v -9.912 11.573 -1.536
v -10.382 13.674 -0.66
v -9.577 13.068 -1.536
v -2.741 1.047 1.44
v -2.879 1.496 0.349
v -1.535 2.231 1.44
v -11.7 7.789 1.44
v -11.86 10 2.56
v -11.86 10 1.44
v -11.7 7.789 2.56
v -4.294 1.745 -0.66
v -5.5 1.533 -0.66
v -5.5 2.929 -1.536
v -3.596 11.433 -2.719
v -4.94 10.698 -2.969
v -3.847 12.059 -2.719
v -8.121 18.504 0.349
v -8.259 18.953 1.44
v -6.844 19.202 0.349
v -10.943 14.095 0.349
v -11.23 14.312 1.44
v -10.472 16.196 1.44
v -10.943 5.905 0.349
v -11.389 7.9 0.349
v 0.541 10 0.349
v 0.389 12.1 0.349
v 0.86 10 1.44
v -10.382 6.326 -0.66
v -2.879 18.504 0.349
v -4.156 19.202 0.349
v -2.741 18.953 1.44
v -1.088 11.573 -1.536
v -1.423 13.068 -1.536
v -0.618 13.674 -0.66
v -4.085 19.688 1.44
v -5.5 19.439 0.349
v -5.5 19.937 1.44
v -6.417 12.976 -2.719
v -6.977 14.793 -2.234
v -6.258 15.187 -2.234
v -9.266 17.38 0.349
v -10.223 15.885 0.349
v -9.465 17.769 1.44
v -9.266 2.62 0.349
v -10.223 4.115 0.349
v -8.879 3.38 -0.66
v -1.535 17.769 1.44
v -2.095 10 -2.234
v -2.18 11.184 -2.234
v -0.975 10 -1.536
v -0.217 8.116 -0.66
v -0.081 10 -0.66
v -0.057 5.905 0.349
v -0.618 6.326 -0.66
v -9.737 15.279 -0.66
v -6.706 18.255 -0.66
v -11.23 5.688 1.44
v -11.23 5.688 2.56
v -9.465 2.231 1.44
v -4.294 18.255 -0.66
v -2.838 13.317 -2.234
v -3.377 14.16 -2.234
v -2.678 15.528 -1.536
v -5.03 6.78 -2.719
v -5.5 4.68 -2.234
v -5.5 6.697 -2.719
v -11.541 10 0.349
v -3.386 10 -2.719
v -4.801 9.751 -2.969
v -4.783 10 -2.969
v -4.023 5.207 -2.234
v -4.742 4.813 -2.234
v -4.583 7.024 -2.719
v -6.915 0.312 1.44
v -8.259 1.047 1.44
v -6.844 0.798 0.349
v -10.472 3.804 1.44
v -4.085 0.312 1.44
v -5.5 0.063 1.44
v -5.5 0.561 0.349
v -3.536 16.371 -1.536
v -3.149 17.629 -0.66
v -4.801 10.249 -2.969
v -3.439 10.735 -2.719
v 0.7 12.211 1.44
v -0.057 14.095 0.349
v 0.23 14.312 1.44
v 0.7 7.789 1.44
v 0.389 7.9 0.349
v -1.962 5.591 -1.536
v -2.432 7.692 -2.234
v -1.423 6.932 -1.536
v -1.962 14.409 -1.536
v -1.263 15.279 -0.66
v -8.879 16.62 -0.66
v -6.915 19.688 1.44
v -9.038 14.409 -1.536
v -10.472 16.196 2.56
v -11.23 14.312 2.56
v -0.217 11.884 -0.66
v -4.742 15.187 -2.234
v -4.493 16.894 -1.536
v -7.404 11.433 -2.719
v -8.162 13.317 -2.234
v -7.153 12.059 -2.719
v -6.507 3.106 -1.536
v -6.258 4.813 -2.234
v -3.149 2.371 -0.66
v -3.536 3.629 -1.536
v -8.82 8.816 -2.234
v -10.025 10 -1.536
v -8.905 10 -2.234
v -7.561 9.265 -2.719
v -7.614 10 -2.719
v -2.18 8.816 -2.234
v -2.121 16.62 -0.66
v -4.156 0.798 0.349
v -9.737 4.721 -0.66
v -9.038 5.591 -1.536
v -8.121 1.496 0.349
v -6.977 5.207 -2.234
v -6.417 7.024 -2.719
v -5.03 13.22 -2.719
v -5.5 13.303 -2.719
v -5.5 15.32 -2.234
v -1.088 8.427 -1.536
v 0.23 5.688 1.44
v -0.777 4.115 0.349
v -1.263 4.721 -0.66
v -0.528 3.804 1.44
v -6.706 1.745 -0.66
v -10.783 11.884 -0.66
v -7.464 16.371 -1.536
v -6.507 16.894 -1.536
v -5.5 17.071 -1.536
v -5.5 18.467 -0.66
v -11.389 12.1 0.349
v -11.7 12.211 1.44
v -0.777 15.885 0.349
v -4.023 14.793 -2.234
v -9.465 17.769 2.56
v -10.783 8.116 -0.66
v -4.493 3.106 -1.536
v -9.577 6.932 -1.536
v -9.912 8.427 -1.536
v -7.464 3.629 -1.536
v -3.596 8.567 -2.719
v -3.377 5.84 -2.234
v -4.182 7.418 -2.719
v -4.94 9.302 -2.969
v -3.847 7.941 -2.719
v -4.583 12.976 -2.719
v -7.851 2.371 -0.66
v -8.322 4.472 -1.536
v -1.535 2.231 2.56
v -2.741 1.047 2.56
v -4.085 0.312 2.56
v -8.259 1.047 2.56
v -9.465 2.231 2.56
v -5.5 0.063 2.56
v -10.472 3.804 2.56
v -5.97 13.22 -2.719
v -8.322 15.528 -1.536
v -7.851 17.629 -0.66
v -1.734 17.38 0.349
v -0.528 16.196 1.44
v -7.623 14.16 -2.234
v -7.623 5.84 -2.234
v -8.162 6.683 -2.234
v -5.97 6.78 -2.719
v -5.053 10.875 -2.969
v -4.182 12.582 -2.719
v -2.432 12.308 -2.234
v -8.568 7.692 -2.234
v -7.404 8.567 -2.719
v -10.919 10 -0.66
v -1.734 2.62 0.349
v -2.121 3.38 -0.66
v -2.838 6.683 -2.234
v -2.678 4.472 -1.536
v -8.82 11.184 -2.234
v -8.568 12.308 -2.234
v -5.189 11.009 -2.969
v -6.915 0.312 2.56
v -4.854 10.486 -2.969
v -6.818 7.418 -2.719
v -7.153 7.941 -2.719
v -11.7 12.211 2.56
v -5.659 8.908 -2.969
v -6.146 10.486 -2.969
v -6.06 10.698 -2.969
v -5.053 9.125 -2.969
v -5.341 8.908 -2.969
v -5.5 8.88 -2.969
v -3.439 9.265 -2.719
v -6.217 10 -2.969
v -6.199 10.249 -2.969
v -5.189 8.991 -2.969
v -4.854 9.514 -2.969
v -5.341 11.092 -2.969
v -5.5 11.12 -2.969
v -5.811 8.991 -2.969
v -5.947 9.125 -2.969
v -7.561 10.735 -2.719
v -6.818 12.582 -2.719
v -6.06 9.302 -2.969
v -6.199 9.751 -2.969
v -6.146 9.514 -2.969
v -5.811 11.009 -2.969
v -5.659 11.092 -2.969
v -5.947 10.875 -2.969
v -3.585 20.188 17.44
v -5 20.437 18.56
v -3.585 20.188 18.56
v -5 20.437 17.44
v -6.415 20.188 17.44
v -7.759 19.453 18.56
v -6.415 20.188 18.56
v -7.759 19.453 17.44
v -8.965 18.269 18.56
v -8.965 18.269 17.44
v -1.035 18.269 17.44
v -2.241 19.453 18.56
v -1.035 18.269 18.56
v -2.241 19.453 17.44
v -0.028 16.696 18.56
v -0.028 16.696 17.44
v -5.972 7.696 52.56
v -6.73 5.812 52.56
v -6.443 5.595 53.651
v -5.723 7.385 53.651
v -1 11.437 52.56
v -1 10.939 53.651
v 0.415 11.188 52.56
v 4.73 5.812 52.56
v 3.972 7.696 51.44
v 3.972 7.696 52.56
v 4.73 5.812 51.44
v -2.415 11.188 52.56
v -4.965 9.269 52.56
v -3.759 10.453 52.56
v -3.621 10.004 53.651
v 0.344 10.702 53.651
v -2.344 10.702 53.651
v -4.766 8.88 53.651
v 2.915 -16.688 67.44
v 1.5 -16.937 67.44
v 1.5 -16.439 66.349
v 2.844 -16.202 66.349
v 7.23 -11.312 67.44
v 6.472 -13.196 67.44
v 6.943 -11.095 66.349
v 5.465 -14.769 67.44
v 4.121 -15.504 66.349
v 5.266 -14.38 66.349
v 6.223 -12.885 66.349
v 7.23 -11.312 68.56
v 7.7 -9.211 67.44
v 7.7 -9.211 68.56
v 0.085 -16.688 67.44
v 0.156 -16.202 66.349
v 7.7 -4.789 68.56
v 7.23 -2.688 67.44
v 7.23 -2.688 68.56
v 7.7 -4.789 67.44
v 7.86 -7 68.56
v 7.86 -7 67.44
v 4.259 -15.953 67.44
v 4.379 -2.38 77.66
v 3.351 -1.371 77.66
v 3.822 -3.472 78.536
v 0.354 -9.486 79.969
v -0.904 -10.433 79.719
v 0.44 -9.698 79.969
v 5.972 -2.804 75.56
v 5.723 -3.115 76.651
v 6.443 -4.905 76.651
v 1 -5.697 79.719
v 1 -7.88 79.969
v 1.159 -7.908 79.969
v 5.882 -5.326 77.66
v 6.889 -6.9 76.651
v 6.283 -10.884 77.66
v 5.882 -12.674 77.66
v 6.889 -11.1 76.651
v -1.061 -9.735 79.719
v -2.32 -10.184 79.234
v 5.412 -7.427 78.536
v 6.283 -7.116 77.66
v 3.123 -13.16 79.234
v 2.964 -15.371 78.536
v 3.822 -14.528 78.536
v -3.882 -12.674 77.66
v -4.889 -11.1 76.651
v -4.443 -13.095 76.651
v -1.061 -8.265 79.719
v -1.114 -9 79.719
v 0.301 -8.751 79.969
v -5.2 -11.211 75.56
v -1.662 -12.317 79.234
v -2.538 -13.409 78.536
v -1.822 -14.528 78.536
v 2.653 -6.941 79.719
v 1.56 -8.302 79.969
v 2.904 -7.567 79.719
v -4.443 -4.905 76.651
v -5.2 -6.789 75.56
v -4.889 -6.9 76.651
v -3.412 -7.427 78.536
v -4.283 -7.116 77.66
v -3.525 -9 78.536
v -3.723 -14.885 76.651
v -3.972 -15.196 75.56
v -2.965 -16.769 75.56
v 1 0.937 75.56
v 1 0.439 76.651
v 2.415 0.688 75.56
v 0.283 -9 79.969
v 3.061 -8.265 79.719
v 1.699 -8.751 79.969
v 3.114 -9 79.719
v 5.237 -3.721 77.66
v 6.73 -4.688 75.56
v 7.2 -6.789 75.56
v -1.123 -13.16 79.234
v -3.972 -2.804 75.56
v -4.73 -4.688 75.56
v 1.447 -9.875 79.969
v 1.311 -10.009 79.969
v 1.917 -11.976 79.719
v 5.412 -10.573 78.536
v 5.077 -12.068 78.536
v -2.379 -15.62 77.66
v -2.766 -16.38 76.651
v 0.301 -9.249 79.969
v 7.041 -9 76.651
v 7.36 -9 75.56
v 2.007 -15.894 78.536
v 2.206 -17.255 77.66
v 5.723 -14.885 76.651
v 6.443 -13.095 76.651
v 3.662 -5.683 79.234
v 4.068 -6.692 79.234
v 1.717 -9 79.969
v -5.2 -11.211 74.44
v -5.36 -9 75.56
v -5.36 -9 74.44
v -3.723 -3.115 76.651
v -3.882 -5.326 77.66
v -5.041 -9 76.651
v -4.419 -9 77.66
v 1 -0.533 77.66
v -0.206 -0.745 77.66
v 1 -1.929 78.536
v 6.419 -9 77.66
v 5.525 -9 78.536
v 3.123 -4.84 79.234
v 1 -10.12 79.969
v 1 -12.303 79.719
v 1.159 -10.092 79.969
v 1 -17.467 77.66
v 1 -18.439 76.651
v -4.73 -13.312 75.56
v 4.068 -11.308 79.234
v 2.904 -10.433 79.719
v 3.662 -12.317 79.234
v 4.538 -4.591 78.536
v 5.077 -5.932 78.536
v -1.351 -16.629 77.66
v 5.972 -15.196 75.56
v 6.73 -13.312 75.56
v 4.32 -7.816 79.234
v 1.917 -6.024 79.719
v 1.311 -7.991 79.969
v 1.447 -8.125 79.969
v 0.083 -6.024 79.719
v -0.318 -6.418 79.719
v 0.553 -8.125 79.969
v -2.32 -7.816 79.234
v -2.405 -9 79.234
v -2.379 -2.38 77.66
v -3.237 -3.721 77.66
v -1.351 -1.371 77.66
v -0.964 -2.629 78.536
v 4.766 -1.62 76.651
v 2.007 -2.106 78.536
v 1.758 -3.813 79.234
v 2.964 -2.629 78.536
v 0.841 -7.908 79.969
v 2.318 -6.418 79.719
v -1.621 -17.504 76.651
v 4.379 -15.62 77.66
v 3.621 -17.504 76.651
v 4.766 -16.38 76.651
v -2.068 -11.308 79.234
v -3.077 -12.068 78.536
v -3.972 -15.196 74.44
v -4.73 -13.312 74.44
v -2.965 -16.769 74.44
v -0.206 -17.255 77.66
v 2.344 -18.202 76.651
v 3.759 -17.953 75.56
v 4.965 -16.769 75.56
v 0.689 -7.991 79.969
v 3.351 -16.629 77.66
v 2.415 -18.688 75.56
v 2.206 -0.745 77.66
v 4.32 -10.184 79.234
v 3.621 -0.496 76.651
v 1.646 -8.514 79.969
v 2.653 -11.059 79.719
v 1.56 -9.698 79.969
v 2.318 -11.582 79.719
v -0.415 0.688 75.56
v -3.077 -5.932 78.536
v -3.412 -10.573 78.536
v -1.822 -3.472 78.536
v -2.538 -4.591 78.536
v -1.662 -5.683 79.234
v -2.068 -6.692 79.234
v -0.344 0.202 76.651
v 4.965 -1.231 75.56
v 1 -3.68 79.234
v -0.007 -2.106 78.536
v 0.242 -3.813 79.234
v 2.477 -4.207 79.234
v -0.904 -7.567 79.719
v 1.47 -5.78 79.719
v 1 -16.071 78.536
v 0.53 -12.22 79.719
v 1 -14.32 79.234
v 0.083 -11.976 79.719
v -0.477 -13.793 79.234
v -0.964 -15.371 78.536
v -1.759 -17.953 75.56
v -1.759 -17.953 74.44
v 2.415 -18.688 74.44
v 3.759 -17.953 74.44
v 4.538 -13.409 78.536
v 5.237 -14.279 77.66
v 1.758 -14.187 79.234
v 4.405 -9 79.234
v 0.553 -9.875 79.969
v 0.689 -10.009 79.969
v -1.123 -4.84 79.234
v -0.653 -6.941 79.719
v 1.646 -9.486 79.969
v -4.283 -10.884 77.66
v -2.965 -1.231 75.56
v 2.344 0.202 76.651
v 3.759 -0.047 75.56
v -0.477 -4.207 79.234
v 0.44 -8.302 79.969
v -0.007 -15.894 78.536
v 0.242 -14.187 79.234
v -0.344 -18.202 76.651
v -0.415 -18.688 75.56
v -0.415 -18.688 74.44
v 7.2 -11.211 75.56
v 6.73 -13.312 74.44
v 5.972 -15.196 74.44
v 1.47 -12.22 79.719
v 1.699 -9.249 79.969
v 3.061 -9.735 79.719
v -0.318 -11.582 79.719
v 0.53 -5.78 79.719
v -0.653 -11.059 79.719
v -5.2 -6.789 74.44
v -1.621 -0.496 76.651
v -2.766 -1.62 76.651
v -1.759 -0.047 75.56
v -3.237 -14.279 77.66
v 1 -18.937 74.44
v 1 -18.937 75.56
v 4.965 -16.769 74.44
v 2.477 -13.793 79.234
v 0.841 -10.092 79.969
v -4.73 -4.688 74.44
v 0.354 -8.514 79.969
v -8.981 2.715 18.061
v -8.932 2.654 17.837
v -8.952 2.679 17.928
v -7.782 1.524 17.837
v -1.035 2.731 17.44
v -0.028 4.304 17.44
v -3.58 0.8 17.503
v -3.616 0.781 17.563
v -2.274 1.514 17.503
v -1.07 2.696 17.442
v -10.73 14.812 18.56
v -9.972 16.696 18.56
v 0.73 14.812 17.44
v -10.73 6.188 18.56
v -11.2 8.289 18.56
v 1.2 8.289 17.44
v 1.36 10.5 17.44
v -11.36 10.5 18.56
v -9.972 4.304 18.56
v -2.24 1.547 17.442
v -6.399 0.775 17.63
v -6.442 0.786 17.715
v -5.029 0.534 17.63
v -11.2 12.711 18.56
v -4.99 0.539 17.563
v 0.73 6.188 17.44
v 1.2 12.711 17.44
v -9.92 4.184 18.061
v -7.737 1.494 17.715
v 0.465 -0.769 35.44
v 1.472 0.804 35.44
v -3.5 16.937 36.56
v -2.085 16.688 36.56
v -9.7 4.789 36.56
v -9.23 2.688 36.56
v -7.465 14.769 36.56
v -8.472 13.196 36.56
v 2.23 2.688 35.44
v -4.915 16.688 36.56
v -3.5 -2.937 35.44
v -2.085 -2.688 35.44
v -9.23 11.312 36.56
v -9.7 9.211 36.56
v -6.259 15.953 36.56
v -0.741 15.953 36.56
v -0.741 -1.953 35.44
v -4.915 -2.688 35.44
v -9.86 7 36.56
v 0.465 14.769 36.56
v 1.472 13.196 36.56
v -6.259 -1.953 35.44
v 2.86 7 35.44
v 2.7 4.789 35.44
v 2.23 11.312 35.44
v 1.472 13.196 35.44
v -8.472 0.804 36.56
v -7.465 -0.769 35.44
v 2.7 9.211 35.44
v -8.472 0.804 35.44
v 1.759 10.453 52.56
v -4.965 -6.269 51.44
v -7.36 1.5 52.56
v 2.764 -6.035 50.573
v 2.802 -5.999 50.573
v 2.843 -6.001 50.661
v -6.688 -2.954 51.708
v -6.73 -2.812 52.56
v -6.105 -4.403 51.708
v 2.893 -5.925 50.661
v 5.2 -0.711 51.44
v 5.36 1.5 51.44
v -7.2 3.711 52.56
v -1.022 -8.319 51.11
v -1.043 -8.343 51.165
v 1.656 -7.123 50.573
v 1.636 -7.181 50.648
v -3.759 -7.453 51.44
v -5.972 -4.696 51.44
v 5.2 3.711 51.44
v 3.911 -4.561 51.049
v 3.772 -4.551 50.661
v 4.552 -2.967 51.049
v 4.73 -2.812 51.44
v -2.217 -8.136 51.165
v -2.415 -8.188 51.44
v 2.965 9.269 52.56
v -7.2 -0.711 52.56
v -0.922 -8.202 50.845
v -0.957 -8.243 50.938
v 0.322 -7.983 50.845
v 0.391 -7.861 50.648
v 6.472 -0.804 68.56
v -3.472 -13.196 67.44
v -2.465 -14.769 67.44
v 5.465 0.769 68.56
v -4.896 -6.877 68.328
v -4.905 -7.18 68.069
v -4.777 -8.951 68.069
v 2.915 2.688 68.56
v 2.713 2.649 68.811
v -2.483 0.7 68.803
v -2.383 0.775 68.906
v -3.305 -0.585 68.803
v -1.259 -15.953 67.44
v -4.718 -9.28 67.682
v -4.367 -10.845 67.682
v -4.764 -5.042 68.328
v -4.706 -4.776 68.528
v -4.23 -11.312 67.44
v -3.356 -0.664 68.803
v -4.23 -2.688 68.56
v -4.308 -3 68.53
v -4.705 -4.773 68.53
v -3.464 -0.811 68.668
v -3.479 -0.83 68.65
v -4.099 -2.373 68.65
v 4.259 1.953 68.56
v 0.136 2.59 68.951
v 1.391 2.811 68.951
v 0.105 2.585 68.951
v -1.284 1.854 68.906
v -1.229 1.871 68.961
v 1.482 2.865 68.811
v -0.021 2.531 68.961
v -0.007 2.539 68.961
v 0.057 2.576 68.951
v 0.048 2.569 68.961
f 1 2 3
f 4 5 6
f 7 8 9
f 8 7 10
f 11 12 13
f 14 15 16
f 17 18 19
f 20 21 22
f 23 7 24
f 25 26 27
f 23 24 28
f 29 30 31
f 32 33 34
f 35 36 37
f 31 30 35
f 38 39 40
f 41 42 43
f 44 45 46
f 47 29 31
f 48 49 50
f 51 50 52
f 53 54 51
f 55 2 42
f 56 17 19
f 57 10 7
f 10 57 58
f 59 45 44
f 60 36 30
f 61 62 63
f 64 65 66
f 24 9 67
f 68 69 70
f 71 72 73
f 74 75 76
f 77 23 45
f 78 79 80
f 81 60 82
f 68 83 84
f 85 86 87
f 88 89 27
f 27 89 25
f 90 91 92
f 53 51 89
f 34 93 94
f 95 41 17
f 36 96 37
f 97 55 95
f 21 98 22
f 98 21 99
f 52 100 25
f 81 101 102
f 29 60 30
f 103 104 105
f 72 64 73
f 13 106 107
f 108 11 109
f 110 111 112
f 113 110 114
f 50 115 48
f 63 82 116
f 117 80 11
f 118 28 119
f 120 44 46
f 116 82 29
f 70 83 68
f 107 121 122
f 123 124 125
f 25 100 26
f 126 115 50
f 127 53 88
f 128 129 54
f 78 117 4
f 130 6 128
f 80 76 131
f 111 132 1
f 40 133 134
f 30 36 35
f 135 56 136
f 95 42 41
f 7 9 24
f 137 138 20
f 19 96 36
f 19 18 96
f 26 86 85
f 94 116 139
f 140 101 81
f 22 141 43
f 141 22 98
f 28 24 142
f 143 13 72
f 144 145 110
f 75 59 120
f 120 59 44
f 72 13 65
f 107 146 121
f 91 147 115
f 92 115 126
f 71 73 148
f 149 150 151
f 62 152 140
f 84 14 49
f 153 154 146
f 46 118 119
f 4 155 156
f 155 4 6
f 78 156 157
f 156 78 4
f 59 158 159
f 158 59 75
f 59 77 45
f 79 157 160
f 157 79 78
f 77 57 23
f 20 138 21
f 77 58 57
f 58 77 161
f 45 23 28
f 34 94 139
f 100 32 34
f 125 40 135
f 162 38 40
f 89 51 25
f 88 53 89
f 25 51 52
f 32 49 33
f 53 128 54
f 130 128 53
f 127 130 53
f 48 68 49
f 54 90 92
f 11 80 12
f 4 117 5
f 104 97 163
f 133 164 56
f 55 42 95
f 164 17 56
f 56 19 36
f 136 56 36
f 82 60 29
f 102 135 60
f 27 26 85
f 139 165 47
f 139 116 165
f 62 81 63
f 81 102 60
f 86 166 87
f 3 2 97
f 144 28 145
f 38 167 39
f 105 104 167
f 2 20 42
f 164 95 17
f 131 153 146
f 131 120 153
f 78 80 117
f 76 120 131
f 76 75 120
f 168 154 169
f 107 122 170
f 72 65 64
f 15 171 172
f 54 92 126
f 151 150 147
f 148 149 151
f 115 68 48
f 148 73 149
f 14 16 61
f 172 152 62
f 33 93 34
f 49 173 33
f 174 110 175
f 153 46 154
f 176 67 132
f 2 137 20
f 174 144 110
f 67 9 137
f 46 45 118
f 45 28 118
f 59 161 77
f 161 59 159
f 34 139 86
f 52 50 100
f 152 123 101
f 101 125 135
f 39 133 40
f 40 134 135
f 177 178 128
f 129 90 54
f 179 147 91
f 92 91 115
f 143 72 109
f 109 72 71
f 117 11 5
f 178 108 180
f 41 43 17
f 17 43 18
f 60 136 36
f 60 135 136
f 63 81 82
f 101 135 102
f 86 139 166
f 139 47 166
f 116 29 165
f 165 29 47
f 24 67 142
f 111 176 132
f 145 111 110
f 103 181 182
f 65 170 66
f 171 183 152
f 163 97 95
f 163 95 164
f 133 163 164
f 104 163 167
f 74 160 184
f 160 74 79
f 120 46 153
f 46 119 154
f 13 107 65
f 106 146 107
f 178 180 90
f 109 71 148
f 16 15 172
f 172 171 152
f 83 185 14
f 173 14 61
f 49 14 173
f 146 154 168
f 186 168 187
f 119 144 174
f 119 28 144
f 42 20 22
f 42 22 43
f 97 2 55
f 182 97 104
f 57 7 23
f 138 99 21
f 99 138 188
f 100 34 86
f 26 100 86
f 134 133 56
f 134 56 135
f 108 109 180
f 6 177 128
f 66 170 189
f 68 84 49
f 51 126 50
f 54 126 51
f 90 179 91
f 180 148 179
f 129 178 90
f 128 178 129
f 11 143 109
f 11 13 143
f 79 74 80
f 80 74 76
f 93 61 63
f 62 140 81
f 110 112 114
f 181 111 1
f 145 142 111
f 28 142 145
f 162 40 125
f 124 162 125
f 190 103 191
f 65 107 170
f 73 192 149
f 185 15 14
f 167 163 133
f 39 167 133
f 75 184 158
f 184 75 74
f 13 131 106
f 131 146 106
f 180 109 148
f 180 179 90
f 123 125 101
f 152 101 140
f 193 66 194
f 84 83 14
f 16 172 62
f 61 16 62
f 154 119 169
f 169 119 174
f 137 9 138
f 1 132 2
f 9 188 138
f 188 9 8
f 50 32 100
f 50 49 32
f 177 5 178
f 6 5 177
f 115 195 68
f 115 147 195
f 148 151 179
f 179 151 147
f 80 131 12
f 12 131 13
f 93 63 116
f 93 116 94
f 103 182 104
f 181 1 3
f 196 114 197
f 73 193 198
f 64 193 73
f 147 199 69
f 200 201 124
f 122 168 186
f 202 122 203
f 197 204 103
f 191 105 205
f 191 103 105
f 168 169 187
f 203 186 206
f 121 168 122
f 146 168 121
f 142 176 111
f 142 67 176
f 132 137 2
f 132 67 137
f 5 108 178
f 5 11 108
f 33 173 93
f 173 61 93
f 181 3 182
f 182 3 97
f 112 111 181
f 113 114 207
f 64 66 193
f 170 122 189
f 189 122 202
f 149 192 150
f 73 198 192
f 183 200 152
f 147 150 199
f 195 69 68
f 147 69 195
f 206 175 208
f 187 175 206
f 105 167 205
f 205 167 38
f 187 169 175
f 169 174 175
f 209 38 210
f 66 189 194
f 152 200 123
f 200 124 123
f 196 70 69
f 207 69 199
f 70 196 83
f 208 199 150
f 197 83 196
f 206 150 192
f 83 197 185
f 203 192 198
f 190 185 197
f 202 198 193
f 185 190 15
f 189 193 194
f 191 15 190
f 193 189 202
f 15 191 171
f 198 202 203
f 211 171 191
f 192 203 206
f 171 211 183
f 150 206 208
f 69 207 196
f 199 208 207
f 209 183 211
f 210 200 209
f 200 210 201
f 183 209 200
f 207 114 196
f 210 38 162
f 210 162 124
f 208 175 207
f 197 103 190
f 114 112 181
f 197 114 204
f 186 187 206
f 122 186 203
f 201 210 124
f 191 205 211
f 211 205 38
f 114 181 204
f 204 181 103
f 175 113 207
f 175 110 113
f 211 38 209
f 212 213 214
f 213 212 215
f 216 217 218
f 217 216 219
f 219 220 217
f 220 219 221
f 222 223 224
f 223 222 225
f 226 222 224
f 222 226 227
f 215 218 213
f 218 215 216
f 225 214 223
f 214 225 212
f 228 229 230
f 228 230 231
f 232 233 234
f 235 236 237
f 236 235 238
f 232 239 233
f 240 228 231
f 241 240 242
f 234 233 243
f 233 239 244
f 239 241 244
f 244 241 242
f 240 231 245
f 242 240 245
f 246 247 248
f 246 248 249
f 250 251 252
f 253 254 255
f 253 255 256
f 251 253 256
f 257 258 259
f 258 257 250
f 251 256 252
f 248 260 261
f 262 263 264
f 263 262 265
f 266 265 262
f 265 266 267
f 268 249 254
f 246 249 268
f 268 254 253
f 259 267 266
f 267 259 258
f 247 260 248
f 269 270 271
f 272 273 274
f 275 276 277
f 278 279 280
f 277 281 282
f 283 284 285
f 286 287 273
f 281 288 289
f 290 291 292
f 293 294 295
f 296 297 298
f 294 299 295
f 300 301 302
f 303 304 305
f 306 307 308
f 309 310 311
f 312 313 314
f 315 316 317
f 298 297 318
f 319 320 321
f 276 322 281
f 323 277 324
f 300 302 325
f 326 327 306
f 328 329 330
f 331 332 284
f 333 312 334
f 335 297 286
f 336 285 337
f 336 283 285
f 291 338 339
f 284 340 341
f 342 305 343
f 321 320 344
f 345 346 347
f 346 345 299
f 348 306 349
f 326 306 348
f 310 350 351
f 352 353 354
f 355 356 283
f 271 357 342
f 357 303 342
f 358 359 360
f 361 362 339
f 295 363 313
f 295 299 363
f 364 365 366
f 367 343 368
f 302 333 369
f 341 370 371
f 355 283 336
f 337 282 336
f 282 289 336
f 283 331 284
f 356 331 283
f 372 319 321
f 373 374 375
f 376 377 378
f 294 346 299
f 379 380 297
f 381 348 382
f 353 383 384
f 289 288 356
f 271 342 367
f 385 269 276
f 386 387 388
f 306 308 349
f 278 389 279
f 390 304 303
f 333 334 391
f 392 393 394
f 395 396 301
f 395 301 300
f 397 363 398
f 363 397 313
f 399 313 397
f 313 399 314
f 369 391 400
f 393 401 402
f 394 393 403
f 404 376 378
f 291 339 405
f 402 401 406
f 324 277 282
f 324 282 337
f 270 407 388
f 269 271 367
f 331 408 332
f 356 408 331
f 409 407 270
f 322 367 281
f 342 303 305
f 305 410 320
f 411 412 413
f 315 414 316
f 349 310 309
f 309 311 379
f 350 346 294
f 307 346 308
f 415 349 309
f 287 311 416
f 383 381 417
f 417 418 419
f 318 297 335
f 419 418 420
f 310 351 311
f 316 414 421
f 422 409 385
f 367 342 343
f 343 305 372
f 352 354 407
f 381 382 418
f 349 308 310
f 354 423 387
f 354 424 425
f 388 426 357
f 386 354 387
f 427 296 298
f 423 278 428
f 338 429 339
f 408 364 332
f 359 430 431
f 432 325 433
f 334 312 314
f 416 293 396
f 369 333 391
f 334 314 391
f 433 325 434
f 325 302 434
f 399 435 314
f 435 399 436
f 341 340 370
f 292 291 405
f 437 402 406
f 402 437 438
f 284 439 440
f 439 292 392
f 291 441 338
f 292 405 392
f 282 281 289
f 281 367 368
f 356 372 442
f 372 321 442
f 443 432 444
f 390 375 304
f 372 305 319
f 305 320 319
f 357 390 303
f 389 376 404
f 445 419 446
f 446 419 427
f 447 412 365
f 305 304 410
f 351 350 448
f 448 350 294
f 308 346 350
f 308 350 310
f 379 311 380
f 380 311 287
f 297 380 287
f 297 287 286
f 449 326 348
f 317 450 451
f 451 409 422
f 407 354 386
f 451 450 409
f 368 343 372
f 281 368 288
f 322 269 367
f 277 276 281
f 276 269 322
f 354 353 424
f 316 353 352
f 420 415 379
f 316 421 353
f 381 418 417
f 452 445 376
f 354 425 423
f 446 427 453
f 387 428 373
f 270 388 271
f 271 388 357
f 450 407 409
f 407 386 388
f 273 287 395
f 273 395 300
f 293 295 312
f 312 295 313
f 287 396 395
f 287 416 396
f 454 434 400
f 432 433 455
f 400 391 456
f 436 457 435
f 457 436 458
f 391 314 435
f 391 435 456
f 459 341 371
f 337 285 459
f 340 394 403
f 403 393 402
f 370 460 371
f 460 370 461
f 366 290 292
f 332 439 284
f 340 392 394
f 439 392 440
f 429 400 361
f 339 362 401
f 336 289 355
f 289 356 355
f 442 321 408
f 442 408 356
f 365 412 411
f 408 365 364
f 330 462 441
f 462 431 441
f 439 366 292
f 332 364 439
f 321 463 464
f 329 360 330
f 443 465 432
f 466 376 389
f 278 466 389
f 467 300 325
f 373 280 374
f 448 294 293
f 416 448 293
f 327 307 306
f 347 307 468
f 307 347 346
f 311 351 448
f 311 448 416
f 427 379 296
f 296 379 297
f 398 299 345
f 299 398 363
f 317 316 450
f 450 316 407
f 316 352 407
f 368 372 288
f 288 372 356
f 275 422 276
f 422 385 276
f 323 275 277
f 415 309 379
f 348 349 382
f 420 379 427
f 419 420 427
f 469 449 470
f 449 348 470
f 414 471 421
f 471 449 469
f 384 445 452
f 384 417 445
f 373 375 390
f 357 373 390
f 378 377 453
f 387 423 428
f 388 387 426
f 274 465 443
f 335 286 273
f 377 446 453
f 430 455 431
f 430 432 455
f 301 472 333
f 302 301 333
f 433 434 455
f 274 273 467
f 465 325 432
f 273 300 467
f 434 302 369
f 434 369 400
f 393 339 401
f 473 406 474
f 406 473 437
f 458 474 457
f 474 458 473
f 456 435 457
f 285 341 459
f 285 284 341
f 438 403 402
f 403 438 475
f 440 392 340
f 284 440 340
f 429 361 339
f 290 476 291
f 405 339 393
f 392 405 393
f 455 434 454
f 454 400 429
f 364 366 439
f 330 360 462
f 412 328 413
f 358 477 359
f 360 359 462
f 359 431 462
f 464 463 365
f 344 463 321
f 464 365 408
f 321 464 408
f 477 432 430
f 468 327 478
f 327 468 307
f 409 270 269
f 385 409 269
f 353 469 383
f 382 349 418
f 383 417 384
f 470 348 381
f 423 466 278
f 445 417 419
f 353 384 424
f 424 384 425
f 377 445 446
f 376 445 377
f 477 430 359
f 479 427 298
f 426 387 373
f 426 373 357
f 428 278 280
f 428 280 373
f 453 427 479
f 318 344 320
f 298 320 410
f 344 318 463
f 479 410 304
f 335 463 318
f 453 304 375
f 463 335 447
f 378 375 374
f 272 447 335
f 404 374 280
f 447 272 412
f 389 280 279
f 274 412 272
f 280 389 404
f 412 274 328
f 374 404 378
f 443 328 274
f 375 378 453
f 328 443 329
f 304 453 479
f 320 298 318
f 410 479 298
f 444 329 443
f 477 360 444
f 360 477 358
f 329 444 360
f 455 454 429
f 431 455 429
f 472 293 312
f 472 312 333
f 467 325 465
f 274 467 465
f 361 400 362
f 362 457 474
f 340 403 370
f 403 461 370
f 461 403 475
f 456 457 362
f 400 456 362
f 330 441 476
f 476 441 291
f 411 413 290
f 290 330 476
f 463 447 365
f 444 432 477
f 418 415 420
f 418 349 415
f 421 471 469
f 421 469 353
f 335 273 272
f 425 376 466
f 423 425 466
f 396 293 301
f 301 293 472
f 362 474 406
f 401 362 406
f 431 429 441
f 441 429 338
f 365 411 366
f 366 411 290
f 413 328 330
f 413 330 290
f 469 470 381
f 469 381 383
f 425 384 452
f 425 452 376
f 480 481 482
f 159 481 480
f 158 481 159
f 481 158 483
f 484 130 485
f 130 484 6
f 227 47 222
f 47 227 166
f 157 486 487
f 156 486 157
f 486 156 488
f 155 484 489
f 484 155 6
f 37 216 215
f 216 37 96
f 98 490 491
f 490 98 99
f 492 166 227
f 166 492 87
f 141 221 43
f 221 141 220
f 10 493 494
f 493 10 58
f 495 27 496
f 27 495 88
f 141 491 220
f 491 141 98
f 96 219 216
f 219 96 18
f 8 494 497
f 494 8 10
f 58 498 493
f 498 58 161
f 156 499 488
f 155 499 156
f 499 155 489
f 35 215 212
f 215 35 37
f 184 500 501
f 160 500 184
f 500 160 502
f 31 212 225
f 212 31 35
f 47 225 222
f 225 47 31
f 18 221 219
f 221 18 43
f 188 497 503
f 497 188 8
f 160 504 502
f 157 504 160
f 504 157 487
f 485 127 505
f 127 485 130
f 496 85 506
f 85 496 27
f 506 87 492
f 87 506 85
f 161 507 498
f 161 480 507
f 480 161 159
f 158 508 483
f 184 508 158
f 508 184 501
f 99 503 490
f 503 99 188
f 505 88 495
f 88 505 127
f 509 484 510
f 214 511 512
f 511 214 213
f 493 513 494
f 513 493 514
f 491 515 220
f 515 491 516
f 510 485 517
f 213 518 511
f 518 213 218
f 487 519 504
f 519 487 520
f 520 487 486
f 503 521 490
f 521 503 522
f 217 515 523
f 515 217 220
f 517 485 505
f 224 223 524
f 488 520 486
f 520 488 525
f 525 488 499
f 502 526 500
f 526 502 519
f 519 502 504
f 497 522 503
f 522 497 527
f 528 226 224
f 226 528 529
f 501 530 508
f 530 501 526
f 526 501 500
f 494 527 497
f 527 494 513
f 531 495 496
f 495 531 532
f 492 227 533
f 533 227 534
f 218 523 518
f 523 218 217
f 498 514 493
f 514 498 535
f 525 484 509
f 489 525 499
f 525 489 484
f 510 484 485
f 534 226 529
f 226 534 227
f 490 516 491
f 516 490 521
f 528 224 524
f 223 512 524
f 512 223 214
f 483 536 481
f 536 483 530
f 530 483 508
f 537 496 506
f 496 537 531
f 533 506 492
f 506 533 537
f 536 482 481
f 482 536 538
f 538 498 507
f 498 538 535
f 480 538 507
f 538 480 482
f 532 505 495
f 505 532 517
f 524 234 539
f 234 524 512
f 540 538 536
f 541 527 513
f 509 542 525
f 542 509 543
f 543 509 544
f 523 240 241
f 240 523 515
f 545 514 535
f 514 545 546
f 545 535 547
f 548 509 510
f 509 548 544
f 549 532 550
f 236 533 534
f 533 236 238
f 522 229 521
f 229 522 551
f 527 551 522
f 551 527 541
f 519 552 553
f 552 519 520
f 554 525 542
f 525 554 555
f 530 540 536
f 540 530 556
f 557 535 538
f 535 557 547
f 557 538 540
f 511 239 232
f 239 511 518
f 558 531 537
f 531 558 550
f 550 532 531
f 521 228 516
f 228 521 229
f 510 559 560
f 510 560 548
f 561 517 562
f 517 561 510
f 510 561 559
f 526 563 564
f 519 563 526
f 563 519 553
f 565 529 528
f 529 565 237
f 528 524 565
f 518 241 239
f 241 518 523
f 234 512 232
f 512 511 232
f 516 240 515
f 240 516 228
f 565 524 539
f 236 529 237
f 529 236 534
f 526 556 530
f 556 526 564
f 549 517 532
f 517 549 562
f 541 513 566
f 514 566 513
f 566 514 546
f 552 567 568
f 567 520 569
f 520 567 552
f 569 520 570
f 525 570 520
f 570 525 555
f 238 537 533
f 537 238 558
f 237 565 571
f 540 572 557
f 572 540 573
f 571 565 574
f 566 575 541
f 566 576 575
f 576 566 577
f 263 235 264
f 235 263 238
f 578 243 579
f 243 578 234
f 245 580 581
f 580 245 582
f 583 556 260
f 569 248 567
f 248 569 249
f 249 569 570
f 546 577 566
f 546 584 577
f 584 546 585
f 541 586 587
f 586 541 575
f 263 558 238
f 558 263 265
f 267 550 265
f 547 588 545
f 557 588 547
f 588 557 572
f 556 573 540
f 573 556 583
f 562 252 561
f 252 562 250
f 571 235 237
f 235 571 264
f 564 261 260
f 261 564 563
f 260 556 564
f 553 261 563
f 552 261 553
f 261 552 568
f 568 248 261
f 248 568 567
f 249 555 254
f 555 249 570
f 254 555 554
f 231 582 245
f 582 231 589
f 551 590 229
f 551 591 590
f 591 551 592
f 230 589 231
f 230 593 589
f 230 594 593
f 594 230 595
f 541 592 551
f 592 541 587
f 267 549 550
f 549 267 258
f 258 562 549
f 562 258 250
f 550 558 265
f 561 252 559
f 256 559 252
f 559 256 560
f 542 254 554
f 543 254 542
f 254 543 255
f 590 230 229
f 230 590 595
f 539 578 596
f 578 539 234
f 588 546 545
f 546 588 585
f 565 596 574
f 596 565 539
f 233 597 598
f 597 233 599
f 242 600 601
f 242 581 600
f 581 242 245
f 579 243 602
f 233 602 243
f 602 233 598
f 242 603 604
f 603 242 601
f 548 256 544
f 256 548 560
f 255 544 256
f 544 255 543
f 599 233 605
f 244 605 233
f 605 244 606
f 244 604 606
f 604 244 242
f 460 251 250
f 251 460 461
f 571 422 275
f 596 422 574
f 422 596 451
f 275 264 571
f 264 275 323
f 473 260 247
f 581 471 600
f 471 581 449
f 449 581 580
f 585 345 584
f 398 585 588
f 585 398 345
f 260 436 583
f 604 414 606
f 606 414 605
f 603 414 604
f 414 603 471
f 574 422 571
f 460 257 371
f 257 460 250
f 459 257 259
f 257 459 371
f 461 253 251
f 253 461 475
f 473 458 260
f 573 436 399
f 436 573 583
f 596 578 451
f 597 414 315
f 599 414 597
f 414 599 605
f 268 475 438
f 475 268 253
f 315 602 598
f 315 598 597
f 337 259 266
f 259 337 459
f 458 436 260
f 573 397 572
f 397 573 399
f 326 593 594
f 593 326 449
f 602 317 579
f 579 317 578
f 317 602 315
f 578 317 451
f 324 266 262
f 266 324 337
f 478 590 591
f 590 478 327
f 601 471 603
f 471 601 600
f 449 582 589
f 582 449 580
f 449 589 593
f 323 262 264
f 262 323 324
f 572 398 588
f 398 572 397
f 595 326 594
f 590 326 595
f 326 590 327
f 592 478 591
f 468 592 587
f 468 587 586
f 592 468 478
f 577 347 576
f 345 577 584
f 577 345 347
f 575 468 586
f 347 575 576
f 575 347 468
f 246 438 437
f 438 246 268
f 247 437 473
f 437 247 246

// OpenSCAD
$fn=28;
MASTER="Camera_Right_Grip_MASTER_98mm.stl";

module ellipsoid(c, r) { translate(c) scale(r) sphere(1); }
module cavity() {
  ellipsoid([-5.5000,10.0000,2.0000], [6.4000,10.0000,5.0000]);
  ellipsoid([-5.0000,10.5000,18.0000], [6.4000,10.0000,5.0000]);
  ellipsoid([-3.5000,7.0000,36.0000], [6.4000,10.0000,5.0000]);
  ellipsoid([-1.0000,1.5000,52.0000], [6.4000,10.0000,5.0000]);
  ellipsoid([1.5000,-7.0000,68.0000], [6.4000,10.0000,5.0000]);
  ellipsoid([1.0000,-9.0000,75.0000], [6.4000,10.0000,5.0000]);
  hull() { ellipsoid([-5.5000,10.0000,2.0000], [6.4000,10.0000,5.0000]); ellipsoid([-5.0000,10.5000,18.0000], [6.4000,10.0000,5.0000]); }
  hull() { ellipsoid([-5.0000,10.5000,18.0000], [6.4000,10.0000,5.0000]); ellipsoid([-3.5000,7.0000,36.0000], [6.4000,10.0000,5.0000]); }
  hull() { ellipsoid([-3.5000,7.0000,36.0000], [6.4000,10.0000,5.0000]); ellipsoid([-1.0000,1.5000,52.0000], [6.4000,10.0000,5.0000]); }
  hull() { ellipsoid([-1.0000,1.5000,52.0000], [6.4000,10.0000,5.0000]); ellipsoid([1.5000,-7.0000,68.0000], [6.4000,10.0000,5.0000]); }
  hull() { ellipsoid([1.5000,-7.0000,68.0000], [6.4000,10.0000,5.0000]); ellipsoid([1.0000,-9.0000,75.0000], [6.4000,10.0000,5.0000]); }
}
cavity();
